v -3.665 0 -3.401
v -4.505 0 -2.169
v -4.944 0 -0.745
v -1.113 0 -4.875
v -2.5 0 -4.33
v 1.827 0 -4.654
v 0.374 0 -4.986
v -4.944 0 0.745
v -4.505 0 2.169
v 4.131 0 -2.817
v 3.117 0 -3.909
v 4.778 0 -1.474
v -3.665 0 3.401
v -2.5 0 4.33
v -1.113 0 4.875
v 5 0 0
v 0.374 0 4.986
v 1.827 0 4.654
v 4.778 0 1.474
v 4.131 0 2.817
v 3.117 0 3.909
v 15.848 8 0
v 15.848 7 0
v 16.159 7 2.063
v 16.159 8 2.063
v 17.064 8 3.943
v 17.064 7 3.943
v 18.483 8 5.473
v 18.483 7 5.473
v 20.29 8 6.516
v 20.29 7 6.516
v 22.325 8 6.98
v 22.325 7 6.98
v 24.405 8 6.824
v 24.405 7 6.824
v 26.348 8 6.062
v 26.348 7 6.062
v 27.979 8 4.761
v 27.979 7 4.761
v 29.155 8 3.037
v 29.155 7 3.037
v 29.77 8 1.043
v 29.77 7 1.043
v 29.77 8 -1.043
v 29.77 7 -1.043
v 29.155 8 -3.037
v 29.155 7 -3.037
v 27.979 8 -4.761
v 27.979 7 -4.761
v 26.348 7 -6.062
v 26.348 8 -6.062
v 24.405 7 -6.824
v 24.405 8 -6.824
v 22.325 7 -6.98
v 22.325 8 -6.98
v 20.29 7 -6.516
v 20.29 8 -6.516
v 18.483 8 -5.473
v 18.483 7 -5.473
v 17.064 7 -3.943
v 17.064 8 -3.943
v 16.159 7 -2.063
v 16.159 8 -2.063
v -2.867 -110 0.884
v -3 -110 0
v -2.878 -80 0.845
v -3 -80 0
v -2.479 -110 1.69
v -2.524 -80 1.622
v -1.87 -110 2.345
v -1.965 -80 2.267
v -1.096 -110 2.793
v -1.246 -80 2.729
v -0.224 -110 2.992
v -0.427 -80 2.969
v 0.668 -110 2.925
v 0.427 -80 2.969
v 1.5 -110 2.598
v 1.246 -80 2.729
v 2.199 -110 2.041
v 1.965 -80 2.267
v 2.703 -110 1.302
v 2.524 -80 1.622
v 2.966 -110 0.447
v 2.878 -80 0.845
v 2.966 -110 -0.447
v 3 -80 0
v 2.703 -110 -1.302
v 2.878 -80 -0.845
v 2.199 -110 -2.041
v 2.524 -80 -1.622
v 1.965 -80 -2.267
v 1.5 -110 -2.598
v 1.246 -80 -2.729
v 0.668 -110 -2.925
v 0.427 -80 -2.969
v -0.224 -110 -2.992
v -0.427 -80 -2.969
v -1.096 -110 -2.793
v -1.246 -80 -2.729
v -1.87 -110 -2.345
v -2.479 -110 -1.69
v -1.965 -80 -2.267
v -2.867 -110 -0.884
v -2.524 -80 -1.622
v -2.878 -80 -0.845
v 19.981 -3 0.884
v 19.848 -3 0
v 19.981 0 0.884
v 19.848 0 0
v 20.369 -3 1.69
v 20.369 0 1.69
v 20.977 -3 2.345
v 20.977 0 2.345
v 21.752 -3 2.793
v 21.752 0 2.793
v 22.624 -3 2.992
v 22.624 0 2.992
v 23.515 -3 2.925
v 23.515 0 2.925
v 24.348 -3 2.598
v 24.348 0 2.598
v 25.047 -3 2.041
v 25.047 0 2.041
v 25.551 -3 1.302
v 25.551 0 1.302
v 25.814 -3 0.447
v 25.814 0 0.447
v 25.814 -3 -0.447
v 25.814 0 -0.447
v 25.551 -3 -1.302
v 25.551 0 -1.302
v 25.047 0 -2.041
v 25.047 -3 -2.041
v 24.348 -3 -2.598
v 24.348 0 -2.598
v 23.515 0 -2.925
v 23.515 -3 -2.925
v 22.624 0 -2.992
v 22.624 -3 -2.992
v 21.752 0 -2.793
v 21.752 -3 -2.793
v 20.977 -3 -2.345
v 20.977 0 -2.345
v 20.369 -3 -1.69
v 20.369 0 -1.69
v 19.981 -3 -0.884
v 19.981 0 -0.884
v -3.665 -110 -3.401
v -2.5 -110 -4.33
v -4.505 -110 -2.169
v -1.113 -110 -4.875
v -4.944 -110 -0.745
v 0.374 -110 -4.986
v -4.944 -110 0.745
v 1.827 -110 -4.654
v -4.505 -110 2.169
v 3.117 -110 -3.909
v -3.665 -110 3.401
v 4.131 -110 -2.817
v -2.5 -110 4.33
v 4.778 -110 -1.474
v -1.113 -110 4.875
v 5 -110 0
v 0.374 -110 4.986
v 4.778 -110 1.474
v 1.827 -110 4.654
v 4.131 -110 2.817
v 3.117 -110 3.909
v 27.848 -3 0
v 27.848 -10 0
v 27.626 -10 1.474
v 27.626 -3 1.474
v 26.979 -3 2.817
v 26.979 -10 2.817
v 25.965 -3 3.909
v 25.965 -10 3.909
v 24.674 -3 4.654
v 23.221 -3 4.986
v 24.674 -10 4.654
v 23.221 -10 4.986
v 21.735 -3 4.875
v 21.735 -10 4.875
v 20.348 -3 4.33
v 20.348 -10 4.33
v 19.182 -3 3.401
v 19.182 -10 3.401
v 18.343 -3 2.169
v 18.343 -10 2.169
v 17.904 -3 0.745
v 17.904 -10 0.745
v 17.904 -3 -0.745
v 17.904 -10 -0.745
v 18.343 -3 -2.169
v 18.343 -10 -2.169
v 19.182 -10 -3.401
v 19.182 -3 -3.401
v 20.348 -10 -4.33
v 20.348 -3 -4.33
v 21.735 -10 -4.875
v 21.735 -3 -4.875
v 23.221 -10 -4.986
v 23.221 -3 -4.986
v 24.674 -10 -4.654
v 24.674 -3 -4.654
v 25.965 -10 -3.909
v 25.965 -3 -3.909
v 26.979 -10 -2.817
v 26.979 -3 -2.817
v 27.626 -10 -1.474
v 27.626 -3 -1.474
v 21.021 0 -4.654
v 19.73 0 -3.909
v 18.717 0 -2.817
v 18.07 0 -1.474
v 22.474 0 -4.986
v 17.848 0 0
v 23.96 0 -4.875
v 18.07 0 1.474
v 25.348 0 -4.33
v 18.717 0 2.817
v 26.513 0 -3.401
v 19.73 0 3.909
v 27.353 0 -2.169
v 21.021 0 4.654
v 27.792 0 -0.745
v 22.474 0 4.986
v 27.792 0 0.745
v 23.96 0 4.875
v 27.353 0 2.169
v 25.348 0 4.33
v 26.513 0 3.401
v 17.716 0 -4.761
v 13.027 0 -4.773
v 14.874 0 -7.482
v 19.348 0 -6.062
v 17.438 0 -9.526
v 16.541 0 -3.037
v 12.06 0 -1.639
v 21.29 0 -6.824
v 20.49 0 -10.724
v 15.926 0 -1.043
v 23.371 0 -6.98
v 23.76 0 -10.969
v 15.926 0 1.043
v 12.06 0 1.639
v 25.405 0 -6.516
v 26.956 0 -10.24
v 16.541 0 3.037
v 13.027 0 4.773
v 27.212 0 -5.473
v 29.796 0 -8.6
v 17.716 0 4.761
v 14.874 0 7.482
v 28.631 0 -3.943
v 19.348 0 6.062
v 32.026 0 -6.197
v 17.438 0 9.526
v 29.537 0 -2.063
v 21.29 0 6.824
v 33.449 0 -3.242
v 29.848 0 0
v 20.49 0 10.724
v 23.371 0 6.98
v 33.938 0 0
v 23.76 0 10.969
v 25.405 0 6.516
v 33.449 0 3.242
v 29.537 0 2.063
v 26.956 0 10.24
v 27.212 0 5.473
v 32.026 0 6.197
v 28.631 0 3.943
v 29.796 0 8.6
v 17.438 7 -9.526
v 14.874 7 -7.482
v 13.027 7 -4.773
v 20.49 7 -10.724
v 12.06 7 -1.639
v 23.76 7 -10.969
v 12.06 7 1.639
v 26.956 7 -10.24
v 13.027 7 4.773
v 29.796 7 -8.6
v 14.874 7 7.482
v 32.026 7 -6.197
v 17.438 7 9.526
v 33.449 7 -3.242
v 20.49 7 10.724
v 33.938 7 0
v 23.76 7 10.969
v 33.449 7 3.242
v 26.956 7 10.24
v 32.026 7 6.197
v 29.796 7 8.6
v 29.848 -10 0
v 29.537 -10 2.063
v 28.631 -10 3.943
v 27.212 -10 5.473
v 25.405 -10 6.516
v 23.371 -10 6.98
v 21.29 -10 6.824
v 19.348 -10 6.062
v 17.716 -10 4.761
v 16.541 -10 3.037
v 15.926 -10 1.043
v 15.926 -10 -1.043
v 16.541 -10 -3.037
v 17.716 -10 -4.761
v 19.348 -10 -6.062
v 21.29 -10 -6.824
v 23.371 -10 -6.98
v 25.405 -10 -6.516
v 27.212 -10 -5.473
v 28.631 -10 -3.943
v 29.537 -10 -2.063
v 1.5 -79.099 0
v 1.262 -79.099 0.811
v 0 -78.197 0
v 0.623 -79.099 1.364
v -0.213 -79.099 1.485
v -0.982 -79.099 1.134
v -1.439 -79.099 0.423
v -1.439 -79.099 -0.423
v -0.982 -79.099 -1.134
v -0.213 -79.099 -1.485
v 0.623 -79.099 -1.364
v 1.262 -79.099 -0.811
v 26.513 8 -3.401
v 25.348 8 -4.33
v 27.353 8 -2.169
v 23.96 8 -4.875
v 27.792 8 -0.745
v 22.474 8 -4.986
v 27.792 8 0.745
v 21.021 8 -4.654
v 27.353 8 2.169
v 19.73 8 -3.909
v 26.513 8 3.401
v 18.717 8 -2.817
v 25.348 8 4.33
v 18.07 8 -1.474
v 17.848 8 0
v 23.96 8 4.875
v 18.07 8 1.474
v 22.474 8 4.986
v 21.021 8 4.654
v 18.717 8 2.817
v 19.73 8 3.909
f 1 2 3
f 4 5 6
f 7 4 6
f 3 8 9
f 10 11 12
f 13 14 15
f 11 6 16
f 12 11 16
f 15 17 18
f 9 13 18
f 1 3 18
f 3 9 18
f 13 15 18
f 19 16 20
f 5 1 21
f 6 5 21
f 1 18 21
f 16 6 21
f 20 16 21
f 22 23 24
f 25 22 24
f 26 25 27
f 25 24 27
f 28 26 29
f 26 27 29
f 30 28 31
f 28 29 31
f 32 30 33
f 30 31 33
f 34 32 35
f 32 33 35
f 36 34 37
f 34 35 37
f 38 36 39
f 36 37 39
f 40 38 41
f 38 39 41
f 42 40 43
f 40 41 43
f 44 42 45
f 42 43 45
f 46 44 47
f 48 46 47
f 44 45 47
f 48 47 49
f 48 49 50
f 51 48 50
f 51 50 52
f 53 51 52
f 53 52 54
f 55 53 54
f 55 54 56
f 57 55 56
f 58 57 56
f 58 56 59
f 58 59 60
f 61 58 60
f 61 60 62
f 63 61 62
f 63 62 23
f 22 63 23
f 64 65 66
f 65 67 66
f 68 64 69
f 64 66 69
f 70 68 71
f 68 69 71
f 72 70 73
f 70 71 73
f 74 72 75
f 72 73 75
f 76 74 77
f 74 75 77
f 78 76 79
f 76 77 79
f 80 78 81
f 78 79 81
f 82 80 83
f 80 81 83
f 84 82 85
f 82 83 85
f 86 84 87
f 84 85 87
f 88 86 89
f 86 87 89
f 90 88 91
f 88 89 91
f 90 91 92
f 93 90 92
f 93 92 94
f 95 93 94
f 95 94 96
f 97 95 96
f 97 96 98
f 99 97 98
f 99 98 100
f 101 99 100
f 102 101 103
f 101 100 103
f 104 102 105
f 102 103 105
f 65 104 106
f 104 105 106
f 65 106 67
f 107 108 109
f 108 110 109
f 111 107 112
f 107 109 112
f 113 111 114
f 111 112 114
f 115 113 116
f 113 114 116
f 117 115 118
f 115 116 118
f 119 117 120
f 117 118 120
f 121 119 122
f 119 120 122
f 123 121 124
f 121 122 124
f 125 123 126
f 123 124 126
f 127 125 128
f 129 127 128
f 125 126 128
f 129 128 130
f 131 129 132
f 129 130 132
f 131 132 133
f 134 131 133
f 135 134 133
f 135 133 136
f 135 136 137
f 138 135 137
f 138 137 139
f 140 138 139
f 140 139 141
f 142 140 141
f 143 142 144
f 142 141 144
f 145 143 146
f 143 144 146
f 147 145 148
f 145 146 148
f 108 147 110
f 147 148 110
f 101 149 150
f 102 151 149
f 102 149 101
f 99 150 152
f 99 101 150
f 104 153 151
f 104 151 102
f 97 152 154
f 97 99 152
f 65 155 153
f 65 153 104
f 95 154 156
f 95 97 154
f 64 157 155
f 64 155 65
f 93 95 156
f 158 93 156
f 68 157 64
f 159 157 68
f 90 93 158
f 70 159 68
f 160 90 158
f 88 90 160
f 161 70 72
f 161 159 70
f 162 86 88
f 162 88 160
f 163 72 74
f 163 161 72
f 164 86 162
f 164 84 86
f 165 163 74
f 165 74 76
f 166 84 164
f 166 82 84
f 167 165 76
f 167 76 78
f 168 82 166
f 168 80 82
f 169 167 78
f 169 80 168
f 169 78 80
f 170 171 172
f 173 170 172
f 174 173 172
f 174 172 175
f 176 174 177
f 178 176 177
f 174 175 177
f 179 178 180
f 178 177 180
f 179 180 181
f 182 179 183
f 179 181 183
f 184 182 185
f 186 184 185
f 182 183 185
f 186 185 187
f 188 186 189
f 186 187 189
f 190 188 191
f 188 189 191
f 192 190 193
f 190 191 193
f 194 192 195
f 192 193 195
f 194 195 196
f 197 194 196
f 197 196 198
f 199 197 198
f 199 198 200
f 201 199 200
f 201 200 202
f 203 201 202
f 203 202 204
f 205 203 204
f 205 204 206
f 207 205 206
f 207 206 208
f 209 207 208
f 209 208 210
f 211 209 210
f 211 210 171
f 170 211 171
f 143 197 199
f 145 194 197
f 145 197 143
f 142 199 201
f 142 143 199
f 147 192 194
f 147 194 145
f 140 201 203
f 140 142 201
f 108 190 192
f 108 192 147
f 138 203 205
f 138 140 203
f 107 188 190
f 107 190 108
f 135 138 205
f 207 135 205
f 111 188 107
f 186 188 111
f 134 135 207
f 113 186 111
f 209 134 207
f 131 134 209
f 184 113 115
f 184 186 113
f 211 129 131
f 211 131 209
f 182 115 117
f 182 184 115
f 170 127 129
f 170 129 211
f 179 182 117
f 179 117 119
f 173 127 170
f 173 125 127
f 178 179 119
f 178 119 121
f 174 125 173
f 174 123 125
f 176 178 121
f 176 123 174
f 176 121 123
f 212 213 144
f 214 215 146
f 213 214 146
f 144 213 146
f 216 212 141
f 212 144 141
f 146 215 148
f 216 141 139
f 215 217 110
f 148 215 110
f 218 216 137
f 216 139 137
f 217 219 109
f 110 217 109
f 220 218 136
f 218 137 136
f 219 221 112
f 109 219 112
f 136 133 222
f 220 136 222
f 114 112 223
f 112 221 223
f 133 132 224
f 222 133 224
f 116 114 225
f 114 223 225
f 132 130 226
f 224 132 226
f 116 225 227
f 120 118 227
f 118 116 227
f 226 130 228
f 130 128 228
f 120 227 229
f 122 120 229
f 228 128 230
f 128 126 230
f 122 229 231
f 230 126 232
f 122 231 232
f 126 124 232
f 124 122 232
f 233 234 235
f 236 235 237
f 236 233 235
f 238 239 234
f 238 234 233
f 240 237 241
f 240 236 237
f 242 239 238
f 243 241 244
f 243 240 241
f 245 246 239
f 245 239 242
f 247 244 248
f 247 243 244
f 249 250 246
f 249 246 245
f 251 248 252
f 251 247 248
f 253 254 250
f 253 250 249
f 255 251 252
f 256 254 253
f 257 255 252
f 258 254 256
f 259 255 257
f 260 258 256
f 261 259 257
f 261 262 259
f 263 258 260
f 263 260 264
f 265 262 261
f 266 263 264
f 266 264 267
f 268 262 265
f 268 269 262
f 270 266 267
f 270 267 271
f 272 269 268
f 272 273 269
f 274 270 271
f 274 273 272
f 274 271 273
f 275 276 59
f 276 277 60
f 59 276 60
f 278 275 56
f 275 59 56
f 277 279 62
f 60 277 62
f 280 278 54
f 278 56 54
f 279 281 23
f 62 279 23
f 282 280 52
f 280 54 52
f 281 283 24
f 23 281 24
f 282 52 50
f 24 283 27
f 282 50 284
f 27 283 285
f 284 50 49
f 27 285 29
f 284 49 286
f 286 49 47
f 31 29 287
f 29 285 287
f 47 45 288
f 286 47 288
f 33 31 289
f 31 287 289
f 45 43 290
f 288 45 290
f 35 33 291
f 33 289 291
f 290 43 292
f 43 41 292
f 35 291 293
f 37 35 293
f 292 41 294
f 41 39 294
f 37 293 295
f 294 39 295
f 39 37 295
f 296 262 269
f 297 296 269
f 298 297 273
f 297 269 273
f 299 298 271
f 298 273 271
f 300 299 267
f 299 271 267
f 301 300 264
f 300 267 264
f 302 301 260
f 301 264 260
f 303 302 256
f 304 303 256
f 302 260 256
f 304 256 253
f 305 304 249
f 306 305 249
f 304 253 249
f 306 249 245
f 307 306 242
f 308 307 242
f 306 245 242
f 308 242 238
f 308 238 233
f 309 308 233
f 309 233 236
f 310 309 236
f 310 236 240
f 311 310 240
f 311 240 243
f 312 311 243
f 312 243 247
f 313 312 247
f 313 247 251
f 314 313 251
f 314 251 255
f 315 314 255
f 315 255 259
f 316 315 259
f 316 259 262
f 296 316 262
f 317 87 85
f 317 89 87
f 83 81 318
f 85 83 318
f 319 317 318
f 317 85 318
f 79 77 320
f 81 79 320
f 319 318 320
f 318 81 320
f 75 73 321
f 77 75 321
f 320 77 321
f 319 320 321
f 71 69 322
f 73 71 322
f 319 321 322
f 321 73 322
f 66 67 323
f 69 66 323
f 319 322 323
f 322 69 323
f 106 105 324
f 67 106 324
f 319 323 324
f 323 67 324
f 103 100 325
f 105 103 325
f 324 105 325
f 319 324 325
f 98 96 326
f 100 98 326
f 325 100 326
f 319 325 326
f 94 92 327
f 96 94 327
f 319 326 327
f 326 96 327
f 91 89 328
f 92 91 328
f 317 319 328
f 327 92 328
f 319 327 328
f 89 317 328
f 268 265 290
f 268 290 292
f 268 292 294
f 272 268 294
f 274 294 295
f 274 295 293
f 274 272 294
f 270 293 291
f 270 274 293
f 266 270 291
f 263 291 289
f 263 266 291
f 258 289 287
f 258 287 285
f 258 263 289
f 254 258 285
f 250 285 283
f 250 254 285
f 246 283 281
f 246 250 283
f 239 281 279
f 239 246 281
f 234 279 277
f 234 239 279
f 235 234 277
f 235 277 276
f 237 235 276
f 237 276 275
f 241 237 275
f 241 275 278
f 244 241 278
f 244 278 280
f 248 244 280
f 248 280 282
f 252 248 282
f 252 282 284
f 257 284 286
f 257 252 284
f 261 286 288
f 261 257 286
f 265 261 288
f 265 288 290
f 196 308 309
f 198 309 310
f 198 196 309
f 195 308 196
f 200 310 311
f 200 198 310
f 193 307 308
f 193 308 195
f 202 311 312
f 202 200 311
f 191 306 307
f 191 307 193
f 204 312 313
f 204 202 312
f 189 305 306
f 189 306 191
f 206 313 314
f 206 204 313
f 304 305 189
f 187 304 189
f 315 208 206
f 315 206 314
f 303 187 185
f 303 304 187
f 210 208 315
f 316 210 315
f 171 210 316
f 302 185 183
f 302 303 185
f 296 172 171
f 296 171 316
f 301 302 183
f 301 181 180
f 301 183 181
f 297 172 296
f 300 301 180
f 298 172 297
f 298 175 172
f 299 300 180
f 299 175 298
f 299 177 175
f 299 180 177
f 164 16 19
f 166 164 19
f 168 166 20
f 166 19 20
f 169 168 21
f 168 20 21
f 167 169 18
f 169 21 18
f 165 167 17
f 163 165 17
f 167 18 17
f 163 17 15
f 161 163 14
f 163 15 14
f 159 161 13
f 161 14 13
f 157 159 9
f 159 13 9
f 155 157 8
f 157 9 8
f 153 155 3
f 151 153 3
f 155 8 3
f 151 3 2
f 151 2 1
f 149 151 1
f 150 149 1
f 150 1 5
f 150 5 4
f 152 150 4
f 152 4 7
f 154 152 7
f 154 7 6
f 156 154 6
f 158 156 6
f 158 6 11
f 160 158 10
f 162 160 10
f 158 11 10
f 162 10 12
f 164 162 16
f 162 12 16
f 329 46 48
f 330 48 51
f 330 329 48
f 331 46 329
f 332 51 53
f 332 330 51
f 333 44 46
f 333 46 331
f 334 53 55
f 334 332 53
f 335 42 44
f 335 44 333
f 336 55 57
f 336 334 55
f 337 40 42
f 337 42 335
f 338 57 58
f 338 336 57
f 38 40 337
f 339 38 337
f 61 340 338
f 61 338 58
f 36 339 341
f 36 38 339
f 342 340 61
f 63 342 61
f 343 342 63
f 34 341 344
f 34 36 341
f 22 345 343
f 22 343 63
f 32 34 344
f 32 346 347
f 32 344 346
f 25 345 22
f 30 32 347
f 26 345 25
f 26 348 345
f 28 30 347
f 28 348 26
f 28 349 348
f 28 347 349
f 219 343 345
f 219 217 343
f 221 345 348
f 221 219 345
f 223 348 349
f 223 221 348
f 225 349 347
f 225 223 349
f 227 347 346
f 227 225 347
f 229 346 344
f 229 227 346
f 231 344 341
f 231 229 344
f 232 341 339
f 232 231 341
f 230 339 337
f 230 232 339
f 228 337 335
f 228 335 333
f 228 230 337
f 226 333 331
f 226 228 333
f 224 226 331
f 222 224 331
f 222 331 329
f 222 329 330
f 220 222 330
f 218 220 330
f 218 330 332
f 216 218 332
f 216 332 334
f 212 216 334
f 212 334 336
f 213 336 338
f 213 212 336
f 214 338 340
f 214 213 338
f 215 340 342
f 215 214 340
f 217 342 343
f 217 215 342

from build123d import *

# Parameters (mm, degrees)
F0_R           = 5
F1_DEPTH       = 110
F3_D           = 6
F3_DEPTH       = 30
F3_TIP         = 1.8025818571
F4_R           = 7
F5_DEPTH       = 10
F7_D           = 6
F7_DEPTH       = 10
F7_CBORE_D     = 10
F7_CBORE_DEPTH = 7
F7_TIP         = 1.8025818571
F8_R           = 7
F8_R_2         = 5
F9_DEPTH       = 8
F10_R          = 11
F11_DEPTH      = 7
F12_DEPTH      = 7


with BuildPart() as f1:
    # F0 (on Front) → F1 (new body)
    with BuildSketch(Plane.XZ):
        Circle(F0_R)
    extrude(amount=F1_DEPTH)

    # F3
    with Locations(Plane.XZ.offset(110)):
        with Locations((0, 0)):
            Hole(F3_D / 2, depth=F3_DEPTH)
            with Locations((0, 0, -(F3_DEPTH + F3_TIP / 2))):  # 118° drill point
                Cone(0, F3_D / 2, F3_TIP, mode=Mode.SUBTRACT)


with BuildPart() as f5:
    # F4 (on Front) → F5 (new body)
    with BuildSketch(Plane.XZ):
        with Locations((22.8477474302, 0)):
            Circle(F4_R)
    extrude(amount=F5_DEPTH)

    # F7
    with Locations(Plane.XZ.offset(10)):
        with Locations((22.8477474302, 0)):
            CounterBoreHole(F7_D / 2, F7_CBORE_D / 2, F7_CBORE_DEPTH, depth=F7_DEPTH)
            with Locations((0, 0, -(F7_DEPTH + F7_TIP / 2))):  # 118° drill point
                Cone(0, F7_D / 2, F7_TIP, mode=Mode.SUBTRACT)

    # F8 (on face) → F9 (join)
    with BuildSketch(Plane(origin=(0, 0, 0), x_dir=(-1, 0, 0), z_dir=(0, 1, 0))):
        with Locations((-22.8477474302, 0)):
            Circle(F8_R)
        with Locations((-22.8477474302, 0)):
            Circle(F8_R_2, mode=Mode.SUBTRACT)
    extrude(amount=F9_DEPTH)

    # F10 (on Front) → F11 (join)
    with BuildSketch(Plane.XZ):
        with Locations((22.9375008494, 0)):
            Circle(F10_R)
    extrude(amount=-F11_DEPTH)

    # F12 (cut): a face of the model
    f12_faces = [f5.faces().sort_by_distance(p)[0] for p in [
        (22.8477474302, 7, 0),
    ]]
    extrude(f12_faces, amount=-F12_DEPTH, mode=Mode.SUBTRACT)


solid = Compound([f1.part, f5.part])
